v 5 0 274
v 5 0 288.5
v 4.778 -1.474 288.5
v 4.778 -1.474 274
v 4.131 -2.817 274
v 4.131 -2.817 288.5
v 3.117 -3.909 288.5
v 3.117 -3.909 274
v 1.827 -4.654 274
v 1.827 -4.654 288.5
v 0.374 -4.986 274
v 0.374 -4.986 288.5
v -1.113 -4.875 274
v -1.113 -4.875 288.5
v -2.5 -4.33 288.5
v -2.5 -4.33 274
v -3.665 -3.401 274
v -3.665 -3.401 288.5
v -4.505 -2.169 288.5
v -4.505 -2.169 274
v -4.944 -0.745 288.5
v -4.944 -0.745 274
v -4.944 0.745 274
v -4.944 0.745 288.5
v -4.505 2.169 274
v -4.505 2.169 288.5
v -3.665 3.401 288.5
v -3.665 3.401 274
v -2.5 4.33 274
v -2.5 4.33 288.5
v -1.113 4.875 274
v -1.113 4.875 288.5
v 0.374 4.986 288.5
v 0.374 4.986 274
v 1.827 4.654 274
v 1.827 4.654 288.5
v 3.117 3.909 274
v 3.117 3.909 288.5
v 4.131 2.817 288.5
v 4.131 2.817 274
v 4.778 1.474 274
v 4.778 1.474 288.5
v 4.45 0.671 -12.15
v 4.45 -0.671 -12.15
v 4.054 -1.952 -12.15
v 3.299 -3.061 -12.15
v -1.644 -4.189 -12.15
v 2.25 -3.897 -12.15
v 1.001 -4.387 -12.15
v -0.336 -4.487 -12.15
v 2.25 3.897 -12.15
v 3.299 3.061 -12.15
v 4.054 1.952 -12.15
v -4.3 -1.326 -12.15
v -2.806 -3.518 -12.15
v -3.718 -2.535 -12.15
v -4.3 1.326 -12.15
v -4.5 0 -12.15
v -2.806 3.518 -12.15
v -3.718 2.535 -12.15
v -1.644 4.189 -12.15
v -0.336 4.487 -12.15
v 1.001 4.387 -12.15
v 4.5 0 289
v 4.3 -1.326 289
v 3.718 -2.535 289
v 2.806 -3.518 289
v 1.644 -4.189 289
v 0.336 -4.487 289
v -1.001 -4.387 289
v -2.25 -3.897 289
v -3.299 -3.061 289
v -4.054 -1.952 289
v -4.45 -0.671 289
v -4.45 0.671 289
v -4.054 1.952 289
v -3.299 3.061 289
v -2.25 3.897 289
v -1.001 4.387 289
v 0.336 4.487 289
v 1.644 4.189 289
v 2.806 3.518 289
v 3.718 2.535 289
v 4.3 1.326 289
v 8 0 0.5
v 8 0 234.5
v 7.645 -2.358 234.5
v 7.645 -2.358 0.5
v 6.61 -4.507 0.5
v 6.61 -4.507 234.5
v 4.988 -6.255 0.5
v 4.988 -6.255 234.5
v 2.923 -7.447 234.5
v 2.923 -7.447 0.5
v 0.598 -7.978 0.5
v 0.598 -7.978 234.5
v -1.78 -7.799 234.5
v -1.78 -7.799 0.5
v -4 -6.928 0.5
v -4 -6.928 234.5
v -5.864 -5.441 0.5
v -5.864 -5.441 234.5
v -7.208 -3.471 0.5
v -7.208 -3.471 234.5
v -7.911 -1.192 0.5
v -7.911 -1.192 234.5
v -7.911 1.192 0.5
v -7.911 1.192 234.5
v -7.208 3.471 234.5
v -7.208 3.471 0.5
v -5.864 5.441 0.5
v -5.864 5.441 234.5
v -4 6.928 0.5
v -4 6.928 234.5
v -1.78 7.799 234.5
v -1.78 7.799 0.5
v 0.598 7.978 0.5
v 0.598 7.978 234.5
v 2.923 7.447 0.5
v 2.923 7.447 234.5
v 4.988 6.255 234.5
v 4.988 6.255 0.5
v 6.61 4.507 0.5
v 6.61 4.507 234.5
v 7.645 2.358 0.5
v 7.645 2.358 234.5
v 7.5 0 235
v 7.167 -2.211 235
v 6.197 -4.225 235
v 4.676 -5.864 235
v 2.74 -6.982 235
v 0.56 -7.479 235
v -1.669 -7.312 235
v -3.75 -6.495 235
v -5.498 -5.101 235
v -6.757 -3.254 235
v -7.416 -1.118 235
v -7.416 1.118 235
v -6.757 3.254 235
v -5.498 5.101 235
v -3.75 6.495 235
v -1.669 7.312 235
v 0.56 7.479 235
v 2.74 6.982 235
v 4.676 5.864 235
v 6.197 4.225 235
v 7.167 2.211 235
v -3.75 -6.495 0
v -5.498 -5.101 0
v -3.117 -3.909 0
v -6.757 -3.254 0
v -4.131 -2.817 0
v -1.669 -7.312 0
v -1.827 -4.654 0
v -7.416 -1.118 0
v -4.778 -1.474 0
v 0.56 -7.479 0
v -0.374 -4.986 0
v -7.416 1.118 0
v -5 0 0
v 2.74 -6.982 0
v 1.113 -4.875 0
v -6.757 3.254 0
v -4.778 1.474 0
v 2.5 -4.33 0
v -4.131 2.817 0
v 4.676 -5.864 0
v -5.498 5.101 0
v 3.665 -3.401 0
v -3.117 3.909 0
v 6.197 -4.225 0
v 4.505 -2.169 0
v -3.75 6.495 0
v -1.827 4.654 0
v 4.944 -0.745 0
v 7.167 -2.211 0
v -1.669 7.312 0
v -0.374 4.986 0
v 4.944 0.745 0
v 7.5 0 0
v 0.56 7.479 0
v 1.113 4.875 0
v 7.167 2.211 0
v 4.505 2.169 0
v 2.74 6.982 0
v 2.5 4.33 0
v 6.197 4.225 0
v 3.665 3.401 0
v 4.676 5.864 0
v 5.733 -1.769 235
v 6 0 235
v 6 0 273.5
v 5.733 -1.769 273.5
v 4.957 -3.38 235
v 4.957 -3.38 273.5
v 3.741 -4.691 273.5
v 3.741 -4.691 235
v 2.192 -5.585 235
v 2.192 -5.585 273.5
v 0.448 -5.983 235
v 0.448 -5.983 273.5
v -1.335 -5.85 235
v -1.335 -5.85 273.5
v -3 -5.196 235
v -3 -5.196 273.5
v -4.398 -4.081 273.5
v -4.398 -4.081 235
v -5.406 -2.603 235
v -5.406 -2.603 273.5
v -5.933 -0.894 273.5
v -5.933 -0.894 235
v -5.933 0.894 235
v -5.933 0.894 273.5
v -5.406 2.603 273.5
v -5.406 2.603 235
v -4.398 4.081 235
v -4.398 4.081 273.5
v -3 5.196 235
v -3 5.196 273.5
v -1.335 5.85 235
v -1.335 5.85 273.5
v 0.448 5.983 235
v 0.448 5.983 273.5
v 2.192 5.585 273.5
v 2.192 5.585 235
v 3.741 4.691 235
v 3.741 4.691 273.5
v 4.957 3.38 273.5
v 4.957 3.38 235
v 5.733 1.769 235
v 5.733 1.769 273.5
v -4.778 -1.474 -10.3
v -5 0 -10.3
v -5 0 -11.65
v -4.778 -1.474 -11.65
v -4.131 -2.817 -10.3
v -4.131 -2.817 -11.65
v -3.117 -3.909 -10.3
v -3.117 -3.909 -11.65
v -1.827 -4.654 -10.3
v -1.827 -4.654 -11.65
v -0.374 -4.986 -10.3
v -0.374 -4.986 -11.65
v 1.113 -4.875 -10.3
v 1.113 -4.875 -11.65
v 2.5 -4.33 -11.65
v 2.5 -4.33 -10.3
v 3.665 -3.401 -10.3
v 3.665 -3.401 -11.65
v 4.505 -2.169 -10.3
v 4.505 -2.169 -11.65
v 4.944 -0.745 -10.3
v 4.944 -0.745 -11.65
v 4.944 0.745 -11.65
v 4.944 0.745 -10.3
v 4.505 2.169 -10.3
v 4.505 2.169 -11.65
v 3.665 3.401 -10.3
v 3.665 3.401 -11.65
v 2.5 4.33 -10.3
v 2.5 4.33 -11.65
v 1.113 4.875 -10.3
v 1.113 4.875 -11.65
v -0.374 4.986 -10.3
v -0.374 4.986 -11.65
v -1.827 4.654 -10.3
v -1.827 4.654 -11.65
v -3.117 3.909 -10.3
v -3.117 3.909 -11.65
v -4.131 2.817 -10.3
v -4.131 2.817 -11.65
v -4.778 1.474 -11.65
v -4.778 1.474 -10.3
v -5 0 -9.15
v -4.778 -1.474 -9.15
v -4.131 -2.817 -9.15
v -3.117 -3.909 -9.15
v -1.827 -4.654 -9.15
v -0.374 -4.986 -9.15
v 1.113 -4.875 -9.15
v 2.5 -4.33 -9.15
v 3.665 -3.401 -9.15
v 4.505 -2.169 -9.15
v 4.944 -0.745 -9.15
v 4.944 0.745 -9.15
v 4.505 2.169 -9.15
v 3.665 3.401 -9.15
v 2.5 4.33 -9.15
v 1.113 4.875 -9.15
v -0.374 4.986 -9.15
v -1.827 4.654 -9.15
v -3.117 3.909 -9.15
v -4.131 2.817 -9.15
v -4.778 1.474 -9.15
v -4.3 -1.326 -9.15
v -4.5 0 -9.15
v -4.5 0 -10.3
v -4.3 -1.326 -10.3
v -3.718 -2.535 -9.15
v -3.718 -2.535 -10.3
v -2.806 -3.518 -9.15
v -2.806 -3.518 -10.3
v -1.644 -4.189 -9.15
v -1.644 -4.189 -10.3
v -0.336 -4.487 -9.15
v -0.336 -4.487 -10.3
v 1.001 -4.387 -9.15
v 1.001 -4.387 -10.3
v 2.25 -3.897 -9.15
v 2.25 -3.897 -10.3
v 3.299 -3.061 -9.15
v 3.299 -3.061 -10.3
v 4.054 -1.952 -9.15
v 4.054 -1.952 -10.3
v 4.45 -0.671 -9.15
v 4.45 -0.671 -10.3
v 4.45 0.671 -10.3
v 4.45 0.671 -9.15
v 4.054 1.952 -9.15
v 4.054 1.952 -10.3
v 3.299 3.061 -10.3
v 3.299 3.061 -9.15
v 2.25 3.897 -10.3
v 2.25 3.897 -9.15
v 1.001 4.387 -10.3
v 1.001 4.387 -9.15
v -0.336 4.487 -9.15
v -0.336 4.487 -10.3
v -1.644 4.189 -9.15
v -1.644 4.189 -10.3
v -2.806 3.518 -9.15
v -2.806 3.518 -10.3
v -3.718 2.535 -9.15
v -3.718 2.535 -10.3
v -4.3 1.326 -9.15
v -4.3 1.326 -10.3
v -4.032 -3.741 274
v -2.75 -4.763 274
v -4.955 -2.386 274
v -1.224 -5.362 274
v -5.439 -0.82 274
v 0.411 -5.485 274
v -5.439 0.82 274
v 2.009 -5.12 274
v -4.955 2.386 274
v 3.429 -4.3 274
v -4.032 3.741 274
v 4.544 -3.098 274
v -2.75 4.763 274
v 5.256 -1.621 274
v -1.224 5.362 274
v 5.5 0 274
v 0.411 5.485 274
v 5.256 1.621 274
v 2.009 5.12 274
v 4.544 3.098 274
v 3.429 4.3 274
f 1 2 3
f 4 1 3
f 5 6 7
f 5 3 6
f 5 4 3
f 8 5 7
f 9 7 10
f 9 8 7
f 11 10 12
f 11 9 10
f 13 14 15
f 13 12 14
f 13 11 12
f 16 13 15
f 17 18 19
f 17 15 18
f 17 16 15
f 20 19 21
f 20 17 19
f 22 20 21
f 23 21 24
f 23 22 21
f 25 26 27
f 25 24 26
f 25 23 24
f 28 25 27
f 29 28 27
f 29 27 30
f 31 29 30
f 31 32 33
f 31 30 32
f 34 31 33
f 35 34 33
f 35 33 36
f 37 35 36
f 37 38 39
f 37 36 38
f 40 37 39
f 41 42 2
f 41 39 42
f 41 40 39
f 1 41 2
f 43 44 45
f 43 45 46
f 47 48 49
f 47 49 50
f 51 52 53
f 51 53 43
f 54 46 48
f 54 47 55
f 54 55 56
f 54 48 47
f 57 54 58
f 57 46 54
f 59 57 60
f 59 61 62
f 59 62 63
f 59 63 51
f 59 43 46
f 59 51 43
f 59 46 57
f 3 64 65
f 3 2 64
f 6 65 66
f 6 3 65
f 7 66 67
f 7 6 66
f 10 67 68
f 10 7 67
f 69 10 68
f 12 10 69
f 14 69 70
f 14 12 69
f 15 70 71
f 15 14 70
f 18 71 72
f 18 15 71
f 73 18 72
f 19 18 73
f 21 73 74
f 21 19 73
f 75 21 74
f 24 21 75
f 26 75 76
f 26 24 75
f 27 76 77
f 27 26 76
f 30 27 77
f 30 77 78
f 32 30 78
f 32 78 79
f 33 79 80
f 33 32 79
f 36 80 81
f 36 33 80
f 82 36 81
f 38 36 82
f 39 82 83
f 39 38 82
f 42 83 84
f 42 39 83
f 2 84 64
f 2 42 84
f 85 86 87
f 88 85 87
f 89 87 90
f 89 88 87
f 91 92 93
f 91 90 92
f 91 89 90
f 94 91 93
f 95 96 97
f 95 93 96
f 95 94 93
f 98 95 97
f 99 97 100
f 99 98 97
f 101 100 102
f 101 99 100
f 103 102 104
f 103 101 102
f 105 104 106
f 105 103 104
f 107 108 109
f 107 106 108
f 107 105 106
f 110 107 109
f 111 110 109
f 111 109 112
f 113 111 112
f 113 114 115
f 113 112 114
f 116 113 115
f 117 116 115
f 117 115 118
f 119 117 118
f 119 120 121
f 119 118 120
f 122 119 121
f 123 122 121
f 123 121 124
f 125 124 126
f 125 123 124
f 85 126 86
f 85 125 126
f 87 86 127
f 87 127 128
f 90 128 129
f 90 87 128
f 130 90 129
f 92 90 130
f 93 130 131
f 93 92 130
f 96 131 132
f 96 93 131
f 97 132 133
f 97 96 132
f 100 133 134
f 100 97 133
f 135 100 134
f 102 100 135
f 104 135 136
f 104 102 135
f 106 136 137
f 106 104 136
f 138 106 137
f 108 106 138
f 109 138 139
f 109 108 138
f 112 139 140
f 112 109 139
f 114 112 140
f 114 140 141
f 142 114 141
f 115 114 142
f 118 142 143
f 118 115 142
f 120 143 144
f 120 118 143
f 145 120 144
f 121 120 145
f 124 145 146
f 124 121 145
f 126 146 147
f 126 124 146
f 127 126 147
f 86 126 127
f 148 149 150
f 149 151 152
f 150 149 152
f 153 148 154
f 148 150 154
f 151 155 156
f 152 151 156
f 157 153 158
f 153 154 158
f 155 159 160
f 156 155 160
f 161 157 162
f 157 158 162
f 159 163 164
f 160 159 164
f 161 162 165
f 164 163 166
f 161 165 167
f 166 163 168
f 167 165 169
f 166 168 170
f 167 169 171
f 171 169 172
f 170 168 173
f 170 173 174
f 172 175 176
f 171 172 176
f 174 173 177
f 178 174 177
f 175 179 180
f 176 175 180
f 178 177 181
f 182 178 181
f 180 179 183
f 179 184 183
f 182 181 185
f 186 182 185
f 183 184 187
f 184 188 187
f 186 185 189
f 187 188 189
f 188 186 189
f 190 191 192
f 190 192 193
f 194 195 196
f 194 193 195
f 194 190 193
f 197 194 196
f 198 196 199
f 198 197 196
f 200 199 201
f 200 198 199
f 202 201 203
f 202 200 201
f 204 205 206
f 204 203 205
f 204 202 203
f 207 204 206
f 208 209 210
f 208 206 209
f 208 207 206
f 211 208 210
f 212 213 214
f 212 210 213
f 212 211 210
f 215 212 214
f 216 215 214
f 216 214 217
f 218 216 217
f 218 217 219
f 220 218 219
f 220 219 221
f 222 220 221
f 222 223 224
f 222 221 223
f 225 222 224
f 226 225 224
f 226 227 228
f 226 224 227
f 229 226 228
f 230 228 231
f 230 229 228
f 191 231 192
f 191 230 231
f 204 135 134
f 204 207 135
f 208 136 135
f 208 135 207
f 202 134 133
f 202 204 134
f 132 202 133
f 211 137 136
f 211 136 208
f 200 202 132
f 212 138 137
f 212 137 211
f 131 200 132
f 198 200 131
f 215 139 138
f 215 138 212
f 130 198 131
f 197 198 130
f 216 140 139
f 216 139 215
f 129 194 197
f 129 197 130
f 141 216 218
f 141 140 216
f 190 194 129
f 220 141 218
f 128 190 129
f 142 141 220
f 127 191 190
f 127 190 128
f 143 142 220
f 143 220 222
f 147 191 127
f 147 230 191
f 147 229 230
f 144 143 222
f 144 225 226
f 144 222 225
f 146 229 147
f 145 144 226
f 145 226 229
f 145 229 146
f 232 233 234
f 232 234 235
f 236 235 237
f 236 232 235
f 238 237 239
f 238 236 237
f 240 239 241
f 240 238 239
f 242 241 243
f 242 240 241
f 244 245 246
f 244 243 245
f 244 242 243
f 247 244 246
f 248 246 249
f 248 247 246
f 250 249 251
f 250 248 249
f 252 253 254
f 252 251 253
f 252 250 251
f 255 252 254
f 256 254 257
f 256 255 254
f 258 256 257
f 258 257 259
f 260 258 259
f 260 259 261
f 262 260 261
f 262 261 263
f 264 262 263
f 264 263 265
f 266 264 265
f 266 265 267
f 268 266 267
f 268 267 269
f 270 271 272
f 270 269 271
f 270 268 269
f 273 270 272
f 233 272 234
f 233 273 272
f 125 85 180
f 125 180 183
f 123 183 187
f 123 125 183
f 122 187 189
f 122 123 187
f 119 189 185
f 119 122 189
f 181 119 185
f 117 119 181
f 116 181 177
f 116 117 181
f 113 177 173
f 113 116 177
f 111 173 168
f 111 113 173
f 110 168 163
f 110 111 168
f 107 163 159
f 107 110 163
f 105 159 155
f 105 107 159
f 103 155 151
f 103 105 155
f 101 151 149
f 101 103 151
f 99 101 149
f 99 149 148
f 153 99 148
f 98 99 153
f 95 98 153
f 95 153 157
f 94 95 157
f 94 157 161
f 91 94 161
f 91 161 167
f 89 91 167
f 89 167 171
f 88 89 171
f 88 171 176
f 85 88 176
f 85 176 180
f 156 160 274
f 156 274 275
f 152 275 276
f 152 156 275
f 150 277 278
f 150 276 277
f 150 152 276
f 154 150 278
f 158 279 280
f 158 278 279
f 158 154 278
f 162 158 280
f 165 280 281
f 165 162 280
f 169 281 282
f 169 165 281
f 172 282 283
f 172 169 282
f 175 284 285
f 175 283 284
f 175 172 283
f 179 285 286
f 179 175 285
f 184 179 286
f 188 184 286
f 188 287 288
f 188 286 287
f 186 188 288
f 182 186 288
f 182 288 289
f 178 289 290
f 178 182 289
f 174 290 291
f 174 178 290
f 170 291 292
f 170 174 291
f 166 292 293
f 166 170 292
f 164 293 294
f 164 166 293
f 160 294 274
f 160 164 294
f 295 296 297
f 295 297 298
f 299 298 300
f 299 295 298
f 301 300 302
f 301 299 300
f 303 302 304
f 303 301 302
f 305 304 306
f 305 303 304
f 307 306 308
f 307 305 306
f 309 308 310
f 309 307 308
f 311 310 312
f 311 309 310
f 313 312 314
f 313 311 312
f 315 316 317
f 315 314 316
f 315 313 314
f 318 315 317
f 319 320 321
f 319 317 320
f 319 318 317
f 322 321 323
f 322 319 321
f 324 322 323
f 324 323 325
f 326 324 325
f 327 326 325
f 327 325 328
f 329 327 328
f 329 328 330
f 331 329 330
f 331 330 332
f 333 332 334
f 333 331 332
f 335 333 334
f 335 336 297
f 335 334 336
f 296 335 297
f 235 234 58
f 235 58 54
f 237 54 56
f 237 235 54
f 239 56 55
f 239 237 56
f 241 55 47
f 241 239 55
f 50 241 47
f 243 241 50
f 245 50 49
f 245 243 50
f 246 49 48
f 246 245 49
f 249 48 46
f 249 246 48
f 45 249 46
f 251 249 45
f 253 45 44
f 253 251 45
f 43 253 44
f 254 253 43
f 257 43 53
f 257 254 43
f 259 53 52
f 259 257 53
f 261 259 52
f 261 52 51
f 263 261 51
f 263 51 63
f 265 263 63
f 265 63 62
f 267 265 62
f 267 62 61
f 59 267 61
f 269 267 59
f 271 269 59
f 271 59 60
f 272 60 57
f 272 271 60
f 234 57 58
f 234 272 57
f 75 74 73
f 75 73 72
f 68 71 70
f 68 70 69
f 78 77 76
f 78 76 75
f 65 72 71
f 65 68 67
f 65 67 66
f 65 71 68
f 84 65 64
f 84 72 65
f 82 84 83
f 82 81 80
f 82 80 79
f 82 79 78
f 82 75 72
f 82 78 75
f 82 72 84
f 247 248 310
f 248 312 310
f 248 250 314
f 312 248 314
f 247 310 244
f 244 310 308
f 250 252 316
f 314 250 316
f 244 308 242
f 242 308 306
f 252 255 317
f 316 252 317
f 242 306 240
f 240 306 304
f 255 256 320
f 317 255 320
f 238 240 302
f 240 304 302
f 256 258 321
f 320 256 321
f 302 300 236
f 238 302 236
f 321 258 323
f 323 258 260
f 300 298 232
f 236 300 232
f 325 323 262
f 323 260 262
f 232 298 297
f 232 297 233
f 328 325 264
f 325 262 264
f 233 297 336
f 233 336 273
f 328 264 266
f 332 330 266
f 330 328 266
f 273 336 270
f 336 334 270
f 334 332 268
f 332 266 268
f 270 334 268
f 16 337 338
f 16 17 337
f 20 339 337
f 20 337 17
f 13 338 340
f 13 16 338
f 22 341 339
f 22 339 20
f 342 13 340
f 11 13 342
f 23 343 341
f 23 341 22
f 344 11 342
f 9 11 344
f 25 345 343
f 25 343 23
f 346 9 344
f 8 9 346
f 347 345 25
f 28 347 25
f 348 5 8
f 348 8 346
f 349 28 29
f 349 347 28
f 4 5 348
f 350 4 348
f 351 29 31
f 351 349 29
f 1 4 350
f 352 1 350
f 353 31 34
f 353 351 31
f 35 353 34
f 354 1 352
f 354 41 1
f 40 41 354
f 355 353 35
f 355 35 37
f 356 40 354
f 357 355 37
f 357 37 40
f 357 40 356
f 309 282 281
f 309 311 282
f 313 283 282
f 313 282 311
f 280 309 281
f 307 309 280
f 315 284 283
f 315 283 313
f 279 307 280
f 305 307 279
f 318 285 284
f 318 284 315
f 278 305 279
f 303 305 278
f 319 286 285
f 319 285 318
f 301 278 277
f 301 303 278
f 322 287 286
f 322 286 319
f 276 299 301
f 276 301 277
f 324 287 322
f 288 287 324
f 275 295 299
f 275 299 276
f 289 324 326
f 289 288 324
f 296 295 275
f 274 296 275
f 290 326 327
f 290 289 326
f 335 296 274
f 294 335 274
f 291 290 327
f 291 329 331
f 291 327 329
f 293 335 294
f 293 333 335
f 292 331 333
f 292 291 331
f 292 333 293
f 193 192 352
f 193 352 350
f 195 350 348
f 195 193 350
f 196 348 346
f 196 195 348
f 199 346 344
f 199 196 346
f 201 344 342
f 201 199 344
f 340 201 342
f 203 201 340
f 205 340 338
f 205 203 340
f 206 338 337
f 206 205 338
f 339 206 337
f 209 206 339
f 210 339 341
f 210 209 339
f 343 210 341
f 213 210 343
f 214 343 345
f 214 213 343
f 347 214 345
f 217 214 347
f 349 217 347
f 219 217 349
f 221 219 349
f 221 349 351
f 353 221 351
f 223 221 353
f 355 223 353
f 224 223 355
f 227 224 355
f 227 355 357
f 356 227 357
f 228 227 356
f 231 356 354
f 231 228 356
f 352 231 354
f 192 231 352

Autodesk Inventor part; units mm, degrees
ref_plane "YZ Plane" through (0, 0, 0) normal (1, 0, 0) x (0, 1, 0)
ref_plane "XZ Plane" through (0, 0, 0) normal (0, 1, 0) x (-1, 0, 0)
ref_plane "XY Plane" through (0, 0, 0) normal (0, 0, 1) x (1, 0, 0)
sketch "Esboço1" plane through (0, 0, 0) normal (0, 0, 1) x (1, 0, 0)
  circle A0 centre (0, 0) radius 8
  dimension "d0" = 16
extrude "Extrusão1" add sketch "Esboço1" along normal blind 235
sketch "Esboço2" plane through (0, 0, 235) normal (0, 0, 1) x (1, 0, 0)
  circle A0 centre (0, 0) radius 6
  dimension "d3" = 12
extrude "Extrusão2" add sketch "Esboço2" along normal blind 39
sketch "Esboço3" plane through (0, 0, 274) normal (0, 0, 1) x (1, 0, 0)
  circle A0 centre (0, 0) radius 5
  dimension "d6" = 10
extrude "Extrusão3" add sketch "Esboço3" along normal blind 15
sketch "Esboço4" plane through (0, 0, 0) normal (0, 0, -1) x (-1, 0, 0)
  circle A0 centre (0, 0) radius 5
  dimension "d9" = 10
extrude "Extrusão4" add sketch "Esboço4" along normal blind 9.15
sketch "Esboço5" plane through (0, 0, -9.15) normal (0, 0, -1) x (-1, 0, 0)
  circle A0 centre (0, 0) radius 4.5
  dimension "d12" = 9
extrude "Extrusão5" add sketch "Esboço5" along normal blind 1.15
sketch "Esboço6" plane through (0, 0, -10.3) normal (0, 0, -1) x (-1, 0, 0)
  circle A0 centre (0, 0) radius 5
  dimension "d15" = 10
extrude "Extrusão6" add sketch "Esboço6" along normal blind 1.85
thread "Rosca1" size "M12x1.75" class "6g" standard "ANSI Metric M Profile" length 14
chamfer "Chanfro1" distance 0.5 angle 45 5 edges at (-5, 0, 289) (-6, 0, 274) (-8, 0, 235) (-8, 0, 0) (5, 0, -12.15)
properties part number "SFU16XX_Z"
